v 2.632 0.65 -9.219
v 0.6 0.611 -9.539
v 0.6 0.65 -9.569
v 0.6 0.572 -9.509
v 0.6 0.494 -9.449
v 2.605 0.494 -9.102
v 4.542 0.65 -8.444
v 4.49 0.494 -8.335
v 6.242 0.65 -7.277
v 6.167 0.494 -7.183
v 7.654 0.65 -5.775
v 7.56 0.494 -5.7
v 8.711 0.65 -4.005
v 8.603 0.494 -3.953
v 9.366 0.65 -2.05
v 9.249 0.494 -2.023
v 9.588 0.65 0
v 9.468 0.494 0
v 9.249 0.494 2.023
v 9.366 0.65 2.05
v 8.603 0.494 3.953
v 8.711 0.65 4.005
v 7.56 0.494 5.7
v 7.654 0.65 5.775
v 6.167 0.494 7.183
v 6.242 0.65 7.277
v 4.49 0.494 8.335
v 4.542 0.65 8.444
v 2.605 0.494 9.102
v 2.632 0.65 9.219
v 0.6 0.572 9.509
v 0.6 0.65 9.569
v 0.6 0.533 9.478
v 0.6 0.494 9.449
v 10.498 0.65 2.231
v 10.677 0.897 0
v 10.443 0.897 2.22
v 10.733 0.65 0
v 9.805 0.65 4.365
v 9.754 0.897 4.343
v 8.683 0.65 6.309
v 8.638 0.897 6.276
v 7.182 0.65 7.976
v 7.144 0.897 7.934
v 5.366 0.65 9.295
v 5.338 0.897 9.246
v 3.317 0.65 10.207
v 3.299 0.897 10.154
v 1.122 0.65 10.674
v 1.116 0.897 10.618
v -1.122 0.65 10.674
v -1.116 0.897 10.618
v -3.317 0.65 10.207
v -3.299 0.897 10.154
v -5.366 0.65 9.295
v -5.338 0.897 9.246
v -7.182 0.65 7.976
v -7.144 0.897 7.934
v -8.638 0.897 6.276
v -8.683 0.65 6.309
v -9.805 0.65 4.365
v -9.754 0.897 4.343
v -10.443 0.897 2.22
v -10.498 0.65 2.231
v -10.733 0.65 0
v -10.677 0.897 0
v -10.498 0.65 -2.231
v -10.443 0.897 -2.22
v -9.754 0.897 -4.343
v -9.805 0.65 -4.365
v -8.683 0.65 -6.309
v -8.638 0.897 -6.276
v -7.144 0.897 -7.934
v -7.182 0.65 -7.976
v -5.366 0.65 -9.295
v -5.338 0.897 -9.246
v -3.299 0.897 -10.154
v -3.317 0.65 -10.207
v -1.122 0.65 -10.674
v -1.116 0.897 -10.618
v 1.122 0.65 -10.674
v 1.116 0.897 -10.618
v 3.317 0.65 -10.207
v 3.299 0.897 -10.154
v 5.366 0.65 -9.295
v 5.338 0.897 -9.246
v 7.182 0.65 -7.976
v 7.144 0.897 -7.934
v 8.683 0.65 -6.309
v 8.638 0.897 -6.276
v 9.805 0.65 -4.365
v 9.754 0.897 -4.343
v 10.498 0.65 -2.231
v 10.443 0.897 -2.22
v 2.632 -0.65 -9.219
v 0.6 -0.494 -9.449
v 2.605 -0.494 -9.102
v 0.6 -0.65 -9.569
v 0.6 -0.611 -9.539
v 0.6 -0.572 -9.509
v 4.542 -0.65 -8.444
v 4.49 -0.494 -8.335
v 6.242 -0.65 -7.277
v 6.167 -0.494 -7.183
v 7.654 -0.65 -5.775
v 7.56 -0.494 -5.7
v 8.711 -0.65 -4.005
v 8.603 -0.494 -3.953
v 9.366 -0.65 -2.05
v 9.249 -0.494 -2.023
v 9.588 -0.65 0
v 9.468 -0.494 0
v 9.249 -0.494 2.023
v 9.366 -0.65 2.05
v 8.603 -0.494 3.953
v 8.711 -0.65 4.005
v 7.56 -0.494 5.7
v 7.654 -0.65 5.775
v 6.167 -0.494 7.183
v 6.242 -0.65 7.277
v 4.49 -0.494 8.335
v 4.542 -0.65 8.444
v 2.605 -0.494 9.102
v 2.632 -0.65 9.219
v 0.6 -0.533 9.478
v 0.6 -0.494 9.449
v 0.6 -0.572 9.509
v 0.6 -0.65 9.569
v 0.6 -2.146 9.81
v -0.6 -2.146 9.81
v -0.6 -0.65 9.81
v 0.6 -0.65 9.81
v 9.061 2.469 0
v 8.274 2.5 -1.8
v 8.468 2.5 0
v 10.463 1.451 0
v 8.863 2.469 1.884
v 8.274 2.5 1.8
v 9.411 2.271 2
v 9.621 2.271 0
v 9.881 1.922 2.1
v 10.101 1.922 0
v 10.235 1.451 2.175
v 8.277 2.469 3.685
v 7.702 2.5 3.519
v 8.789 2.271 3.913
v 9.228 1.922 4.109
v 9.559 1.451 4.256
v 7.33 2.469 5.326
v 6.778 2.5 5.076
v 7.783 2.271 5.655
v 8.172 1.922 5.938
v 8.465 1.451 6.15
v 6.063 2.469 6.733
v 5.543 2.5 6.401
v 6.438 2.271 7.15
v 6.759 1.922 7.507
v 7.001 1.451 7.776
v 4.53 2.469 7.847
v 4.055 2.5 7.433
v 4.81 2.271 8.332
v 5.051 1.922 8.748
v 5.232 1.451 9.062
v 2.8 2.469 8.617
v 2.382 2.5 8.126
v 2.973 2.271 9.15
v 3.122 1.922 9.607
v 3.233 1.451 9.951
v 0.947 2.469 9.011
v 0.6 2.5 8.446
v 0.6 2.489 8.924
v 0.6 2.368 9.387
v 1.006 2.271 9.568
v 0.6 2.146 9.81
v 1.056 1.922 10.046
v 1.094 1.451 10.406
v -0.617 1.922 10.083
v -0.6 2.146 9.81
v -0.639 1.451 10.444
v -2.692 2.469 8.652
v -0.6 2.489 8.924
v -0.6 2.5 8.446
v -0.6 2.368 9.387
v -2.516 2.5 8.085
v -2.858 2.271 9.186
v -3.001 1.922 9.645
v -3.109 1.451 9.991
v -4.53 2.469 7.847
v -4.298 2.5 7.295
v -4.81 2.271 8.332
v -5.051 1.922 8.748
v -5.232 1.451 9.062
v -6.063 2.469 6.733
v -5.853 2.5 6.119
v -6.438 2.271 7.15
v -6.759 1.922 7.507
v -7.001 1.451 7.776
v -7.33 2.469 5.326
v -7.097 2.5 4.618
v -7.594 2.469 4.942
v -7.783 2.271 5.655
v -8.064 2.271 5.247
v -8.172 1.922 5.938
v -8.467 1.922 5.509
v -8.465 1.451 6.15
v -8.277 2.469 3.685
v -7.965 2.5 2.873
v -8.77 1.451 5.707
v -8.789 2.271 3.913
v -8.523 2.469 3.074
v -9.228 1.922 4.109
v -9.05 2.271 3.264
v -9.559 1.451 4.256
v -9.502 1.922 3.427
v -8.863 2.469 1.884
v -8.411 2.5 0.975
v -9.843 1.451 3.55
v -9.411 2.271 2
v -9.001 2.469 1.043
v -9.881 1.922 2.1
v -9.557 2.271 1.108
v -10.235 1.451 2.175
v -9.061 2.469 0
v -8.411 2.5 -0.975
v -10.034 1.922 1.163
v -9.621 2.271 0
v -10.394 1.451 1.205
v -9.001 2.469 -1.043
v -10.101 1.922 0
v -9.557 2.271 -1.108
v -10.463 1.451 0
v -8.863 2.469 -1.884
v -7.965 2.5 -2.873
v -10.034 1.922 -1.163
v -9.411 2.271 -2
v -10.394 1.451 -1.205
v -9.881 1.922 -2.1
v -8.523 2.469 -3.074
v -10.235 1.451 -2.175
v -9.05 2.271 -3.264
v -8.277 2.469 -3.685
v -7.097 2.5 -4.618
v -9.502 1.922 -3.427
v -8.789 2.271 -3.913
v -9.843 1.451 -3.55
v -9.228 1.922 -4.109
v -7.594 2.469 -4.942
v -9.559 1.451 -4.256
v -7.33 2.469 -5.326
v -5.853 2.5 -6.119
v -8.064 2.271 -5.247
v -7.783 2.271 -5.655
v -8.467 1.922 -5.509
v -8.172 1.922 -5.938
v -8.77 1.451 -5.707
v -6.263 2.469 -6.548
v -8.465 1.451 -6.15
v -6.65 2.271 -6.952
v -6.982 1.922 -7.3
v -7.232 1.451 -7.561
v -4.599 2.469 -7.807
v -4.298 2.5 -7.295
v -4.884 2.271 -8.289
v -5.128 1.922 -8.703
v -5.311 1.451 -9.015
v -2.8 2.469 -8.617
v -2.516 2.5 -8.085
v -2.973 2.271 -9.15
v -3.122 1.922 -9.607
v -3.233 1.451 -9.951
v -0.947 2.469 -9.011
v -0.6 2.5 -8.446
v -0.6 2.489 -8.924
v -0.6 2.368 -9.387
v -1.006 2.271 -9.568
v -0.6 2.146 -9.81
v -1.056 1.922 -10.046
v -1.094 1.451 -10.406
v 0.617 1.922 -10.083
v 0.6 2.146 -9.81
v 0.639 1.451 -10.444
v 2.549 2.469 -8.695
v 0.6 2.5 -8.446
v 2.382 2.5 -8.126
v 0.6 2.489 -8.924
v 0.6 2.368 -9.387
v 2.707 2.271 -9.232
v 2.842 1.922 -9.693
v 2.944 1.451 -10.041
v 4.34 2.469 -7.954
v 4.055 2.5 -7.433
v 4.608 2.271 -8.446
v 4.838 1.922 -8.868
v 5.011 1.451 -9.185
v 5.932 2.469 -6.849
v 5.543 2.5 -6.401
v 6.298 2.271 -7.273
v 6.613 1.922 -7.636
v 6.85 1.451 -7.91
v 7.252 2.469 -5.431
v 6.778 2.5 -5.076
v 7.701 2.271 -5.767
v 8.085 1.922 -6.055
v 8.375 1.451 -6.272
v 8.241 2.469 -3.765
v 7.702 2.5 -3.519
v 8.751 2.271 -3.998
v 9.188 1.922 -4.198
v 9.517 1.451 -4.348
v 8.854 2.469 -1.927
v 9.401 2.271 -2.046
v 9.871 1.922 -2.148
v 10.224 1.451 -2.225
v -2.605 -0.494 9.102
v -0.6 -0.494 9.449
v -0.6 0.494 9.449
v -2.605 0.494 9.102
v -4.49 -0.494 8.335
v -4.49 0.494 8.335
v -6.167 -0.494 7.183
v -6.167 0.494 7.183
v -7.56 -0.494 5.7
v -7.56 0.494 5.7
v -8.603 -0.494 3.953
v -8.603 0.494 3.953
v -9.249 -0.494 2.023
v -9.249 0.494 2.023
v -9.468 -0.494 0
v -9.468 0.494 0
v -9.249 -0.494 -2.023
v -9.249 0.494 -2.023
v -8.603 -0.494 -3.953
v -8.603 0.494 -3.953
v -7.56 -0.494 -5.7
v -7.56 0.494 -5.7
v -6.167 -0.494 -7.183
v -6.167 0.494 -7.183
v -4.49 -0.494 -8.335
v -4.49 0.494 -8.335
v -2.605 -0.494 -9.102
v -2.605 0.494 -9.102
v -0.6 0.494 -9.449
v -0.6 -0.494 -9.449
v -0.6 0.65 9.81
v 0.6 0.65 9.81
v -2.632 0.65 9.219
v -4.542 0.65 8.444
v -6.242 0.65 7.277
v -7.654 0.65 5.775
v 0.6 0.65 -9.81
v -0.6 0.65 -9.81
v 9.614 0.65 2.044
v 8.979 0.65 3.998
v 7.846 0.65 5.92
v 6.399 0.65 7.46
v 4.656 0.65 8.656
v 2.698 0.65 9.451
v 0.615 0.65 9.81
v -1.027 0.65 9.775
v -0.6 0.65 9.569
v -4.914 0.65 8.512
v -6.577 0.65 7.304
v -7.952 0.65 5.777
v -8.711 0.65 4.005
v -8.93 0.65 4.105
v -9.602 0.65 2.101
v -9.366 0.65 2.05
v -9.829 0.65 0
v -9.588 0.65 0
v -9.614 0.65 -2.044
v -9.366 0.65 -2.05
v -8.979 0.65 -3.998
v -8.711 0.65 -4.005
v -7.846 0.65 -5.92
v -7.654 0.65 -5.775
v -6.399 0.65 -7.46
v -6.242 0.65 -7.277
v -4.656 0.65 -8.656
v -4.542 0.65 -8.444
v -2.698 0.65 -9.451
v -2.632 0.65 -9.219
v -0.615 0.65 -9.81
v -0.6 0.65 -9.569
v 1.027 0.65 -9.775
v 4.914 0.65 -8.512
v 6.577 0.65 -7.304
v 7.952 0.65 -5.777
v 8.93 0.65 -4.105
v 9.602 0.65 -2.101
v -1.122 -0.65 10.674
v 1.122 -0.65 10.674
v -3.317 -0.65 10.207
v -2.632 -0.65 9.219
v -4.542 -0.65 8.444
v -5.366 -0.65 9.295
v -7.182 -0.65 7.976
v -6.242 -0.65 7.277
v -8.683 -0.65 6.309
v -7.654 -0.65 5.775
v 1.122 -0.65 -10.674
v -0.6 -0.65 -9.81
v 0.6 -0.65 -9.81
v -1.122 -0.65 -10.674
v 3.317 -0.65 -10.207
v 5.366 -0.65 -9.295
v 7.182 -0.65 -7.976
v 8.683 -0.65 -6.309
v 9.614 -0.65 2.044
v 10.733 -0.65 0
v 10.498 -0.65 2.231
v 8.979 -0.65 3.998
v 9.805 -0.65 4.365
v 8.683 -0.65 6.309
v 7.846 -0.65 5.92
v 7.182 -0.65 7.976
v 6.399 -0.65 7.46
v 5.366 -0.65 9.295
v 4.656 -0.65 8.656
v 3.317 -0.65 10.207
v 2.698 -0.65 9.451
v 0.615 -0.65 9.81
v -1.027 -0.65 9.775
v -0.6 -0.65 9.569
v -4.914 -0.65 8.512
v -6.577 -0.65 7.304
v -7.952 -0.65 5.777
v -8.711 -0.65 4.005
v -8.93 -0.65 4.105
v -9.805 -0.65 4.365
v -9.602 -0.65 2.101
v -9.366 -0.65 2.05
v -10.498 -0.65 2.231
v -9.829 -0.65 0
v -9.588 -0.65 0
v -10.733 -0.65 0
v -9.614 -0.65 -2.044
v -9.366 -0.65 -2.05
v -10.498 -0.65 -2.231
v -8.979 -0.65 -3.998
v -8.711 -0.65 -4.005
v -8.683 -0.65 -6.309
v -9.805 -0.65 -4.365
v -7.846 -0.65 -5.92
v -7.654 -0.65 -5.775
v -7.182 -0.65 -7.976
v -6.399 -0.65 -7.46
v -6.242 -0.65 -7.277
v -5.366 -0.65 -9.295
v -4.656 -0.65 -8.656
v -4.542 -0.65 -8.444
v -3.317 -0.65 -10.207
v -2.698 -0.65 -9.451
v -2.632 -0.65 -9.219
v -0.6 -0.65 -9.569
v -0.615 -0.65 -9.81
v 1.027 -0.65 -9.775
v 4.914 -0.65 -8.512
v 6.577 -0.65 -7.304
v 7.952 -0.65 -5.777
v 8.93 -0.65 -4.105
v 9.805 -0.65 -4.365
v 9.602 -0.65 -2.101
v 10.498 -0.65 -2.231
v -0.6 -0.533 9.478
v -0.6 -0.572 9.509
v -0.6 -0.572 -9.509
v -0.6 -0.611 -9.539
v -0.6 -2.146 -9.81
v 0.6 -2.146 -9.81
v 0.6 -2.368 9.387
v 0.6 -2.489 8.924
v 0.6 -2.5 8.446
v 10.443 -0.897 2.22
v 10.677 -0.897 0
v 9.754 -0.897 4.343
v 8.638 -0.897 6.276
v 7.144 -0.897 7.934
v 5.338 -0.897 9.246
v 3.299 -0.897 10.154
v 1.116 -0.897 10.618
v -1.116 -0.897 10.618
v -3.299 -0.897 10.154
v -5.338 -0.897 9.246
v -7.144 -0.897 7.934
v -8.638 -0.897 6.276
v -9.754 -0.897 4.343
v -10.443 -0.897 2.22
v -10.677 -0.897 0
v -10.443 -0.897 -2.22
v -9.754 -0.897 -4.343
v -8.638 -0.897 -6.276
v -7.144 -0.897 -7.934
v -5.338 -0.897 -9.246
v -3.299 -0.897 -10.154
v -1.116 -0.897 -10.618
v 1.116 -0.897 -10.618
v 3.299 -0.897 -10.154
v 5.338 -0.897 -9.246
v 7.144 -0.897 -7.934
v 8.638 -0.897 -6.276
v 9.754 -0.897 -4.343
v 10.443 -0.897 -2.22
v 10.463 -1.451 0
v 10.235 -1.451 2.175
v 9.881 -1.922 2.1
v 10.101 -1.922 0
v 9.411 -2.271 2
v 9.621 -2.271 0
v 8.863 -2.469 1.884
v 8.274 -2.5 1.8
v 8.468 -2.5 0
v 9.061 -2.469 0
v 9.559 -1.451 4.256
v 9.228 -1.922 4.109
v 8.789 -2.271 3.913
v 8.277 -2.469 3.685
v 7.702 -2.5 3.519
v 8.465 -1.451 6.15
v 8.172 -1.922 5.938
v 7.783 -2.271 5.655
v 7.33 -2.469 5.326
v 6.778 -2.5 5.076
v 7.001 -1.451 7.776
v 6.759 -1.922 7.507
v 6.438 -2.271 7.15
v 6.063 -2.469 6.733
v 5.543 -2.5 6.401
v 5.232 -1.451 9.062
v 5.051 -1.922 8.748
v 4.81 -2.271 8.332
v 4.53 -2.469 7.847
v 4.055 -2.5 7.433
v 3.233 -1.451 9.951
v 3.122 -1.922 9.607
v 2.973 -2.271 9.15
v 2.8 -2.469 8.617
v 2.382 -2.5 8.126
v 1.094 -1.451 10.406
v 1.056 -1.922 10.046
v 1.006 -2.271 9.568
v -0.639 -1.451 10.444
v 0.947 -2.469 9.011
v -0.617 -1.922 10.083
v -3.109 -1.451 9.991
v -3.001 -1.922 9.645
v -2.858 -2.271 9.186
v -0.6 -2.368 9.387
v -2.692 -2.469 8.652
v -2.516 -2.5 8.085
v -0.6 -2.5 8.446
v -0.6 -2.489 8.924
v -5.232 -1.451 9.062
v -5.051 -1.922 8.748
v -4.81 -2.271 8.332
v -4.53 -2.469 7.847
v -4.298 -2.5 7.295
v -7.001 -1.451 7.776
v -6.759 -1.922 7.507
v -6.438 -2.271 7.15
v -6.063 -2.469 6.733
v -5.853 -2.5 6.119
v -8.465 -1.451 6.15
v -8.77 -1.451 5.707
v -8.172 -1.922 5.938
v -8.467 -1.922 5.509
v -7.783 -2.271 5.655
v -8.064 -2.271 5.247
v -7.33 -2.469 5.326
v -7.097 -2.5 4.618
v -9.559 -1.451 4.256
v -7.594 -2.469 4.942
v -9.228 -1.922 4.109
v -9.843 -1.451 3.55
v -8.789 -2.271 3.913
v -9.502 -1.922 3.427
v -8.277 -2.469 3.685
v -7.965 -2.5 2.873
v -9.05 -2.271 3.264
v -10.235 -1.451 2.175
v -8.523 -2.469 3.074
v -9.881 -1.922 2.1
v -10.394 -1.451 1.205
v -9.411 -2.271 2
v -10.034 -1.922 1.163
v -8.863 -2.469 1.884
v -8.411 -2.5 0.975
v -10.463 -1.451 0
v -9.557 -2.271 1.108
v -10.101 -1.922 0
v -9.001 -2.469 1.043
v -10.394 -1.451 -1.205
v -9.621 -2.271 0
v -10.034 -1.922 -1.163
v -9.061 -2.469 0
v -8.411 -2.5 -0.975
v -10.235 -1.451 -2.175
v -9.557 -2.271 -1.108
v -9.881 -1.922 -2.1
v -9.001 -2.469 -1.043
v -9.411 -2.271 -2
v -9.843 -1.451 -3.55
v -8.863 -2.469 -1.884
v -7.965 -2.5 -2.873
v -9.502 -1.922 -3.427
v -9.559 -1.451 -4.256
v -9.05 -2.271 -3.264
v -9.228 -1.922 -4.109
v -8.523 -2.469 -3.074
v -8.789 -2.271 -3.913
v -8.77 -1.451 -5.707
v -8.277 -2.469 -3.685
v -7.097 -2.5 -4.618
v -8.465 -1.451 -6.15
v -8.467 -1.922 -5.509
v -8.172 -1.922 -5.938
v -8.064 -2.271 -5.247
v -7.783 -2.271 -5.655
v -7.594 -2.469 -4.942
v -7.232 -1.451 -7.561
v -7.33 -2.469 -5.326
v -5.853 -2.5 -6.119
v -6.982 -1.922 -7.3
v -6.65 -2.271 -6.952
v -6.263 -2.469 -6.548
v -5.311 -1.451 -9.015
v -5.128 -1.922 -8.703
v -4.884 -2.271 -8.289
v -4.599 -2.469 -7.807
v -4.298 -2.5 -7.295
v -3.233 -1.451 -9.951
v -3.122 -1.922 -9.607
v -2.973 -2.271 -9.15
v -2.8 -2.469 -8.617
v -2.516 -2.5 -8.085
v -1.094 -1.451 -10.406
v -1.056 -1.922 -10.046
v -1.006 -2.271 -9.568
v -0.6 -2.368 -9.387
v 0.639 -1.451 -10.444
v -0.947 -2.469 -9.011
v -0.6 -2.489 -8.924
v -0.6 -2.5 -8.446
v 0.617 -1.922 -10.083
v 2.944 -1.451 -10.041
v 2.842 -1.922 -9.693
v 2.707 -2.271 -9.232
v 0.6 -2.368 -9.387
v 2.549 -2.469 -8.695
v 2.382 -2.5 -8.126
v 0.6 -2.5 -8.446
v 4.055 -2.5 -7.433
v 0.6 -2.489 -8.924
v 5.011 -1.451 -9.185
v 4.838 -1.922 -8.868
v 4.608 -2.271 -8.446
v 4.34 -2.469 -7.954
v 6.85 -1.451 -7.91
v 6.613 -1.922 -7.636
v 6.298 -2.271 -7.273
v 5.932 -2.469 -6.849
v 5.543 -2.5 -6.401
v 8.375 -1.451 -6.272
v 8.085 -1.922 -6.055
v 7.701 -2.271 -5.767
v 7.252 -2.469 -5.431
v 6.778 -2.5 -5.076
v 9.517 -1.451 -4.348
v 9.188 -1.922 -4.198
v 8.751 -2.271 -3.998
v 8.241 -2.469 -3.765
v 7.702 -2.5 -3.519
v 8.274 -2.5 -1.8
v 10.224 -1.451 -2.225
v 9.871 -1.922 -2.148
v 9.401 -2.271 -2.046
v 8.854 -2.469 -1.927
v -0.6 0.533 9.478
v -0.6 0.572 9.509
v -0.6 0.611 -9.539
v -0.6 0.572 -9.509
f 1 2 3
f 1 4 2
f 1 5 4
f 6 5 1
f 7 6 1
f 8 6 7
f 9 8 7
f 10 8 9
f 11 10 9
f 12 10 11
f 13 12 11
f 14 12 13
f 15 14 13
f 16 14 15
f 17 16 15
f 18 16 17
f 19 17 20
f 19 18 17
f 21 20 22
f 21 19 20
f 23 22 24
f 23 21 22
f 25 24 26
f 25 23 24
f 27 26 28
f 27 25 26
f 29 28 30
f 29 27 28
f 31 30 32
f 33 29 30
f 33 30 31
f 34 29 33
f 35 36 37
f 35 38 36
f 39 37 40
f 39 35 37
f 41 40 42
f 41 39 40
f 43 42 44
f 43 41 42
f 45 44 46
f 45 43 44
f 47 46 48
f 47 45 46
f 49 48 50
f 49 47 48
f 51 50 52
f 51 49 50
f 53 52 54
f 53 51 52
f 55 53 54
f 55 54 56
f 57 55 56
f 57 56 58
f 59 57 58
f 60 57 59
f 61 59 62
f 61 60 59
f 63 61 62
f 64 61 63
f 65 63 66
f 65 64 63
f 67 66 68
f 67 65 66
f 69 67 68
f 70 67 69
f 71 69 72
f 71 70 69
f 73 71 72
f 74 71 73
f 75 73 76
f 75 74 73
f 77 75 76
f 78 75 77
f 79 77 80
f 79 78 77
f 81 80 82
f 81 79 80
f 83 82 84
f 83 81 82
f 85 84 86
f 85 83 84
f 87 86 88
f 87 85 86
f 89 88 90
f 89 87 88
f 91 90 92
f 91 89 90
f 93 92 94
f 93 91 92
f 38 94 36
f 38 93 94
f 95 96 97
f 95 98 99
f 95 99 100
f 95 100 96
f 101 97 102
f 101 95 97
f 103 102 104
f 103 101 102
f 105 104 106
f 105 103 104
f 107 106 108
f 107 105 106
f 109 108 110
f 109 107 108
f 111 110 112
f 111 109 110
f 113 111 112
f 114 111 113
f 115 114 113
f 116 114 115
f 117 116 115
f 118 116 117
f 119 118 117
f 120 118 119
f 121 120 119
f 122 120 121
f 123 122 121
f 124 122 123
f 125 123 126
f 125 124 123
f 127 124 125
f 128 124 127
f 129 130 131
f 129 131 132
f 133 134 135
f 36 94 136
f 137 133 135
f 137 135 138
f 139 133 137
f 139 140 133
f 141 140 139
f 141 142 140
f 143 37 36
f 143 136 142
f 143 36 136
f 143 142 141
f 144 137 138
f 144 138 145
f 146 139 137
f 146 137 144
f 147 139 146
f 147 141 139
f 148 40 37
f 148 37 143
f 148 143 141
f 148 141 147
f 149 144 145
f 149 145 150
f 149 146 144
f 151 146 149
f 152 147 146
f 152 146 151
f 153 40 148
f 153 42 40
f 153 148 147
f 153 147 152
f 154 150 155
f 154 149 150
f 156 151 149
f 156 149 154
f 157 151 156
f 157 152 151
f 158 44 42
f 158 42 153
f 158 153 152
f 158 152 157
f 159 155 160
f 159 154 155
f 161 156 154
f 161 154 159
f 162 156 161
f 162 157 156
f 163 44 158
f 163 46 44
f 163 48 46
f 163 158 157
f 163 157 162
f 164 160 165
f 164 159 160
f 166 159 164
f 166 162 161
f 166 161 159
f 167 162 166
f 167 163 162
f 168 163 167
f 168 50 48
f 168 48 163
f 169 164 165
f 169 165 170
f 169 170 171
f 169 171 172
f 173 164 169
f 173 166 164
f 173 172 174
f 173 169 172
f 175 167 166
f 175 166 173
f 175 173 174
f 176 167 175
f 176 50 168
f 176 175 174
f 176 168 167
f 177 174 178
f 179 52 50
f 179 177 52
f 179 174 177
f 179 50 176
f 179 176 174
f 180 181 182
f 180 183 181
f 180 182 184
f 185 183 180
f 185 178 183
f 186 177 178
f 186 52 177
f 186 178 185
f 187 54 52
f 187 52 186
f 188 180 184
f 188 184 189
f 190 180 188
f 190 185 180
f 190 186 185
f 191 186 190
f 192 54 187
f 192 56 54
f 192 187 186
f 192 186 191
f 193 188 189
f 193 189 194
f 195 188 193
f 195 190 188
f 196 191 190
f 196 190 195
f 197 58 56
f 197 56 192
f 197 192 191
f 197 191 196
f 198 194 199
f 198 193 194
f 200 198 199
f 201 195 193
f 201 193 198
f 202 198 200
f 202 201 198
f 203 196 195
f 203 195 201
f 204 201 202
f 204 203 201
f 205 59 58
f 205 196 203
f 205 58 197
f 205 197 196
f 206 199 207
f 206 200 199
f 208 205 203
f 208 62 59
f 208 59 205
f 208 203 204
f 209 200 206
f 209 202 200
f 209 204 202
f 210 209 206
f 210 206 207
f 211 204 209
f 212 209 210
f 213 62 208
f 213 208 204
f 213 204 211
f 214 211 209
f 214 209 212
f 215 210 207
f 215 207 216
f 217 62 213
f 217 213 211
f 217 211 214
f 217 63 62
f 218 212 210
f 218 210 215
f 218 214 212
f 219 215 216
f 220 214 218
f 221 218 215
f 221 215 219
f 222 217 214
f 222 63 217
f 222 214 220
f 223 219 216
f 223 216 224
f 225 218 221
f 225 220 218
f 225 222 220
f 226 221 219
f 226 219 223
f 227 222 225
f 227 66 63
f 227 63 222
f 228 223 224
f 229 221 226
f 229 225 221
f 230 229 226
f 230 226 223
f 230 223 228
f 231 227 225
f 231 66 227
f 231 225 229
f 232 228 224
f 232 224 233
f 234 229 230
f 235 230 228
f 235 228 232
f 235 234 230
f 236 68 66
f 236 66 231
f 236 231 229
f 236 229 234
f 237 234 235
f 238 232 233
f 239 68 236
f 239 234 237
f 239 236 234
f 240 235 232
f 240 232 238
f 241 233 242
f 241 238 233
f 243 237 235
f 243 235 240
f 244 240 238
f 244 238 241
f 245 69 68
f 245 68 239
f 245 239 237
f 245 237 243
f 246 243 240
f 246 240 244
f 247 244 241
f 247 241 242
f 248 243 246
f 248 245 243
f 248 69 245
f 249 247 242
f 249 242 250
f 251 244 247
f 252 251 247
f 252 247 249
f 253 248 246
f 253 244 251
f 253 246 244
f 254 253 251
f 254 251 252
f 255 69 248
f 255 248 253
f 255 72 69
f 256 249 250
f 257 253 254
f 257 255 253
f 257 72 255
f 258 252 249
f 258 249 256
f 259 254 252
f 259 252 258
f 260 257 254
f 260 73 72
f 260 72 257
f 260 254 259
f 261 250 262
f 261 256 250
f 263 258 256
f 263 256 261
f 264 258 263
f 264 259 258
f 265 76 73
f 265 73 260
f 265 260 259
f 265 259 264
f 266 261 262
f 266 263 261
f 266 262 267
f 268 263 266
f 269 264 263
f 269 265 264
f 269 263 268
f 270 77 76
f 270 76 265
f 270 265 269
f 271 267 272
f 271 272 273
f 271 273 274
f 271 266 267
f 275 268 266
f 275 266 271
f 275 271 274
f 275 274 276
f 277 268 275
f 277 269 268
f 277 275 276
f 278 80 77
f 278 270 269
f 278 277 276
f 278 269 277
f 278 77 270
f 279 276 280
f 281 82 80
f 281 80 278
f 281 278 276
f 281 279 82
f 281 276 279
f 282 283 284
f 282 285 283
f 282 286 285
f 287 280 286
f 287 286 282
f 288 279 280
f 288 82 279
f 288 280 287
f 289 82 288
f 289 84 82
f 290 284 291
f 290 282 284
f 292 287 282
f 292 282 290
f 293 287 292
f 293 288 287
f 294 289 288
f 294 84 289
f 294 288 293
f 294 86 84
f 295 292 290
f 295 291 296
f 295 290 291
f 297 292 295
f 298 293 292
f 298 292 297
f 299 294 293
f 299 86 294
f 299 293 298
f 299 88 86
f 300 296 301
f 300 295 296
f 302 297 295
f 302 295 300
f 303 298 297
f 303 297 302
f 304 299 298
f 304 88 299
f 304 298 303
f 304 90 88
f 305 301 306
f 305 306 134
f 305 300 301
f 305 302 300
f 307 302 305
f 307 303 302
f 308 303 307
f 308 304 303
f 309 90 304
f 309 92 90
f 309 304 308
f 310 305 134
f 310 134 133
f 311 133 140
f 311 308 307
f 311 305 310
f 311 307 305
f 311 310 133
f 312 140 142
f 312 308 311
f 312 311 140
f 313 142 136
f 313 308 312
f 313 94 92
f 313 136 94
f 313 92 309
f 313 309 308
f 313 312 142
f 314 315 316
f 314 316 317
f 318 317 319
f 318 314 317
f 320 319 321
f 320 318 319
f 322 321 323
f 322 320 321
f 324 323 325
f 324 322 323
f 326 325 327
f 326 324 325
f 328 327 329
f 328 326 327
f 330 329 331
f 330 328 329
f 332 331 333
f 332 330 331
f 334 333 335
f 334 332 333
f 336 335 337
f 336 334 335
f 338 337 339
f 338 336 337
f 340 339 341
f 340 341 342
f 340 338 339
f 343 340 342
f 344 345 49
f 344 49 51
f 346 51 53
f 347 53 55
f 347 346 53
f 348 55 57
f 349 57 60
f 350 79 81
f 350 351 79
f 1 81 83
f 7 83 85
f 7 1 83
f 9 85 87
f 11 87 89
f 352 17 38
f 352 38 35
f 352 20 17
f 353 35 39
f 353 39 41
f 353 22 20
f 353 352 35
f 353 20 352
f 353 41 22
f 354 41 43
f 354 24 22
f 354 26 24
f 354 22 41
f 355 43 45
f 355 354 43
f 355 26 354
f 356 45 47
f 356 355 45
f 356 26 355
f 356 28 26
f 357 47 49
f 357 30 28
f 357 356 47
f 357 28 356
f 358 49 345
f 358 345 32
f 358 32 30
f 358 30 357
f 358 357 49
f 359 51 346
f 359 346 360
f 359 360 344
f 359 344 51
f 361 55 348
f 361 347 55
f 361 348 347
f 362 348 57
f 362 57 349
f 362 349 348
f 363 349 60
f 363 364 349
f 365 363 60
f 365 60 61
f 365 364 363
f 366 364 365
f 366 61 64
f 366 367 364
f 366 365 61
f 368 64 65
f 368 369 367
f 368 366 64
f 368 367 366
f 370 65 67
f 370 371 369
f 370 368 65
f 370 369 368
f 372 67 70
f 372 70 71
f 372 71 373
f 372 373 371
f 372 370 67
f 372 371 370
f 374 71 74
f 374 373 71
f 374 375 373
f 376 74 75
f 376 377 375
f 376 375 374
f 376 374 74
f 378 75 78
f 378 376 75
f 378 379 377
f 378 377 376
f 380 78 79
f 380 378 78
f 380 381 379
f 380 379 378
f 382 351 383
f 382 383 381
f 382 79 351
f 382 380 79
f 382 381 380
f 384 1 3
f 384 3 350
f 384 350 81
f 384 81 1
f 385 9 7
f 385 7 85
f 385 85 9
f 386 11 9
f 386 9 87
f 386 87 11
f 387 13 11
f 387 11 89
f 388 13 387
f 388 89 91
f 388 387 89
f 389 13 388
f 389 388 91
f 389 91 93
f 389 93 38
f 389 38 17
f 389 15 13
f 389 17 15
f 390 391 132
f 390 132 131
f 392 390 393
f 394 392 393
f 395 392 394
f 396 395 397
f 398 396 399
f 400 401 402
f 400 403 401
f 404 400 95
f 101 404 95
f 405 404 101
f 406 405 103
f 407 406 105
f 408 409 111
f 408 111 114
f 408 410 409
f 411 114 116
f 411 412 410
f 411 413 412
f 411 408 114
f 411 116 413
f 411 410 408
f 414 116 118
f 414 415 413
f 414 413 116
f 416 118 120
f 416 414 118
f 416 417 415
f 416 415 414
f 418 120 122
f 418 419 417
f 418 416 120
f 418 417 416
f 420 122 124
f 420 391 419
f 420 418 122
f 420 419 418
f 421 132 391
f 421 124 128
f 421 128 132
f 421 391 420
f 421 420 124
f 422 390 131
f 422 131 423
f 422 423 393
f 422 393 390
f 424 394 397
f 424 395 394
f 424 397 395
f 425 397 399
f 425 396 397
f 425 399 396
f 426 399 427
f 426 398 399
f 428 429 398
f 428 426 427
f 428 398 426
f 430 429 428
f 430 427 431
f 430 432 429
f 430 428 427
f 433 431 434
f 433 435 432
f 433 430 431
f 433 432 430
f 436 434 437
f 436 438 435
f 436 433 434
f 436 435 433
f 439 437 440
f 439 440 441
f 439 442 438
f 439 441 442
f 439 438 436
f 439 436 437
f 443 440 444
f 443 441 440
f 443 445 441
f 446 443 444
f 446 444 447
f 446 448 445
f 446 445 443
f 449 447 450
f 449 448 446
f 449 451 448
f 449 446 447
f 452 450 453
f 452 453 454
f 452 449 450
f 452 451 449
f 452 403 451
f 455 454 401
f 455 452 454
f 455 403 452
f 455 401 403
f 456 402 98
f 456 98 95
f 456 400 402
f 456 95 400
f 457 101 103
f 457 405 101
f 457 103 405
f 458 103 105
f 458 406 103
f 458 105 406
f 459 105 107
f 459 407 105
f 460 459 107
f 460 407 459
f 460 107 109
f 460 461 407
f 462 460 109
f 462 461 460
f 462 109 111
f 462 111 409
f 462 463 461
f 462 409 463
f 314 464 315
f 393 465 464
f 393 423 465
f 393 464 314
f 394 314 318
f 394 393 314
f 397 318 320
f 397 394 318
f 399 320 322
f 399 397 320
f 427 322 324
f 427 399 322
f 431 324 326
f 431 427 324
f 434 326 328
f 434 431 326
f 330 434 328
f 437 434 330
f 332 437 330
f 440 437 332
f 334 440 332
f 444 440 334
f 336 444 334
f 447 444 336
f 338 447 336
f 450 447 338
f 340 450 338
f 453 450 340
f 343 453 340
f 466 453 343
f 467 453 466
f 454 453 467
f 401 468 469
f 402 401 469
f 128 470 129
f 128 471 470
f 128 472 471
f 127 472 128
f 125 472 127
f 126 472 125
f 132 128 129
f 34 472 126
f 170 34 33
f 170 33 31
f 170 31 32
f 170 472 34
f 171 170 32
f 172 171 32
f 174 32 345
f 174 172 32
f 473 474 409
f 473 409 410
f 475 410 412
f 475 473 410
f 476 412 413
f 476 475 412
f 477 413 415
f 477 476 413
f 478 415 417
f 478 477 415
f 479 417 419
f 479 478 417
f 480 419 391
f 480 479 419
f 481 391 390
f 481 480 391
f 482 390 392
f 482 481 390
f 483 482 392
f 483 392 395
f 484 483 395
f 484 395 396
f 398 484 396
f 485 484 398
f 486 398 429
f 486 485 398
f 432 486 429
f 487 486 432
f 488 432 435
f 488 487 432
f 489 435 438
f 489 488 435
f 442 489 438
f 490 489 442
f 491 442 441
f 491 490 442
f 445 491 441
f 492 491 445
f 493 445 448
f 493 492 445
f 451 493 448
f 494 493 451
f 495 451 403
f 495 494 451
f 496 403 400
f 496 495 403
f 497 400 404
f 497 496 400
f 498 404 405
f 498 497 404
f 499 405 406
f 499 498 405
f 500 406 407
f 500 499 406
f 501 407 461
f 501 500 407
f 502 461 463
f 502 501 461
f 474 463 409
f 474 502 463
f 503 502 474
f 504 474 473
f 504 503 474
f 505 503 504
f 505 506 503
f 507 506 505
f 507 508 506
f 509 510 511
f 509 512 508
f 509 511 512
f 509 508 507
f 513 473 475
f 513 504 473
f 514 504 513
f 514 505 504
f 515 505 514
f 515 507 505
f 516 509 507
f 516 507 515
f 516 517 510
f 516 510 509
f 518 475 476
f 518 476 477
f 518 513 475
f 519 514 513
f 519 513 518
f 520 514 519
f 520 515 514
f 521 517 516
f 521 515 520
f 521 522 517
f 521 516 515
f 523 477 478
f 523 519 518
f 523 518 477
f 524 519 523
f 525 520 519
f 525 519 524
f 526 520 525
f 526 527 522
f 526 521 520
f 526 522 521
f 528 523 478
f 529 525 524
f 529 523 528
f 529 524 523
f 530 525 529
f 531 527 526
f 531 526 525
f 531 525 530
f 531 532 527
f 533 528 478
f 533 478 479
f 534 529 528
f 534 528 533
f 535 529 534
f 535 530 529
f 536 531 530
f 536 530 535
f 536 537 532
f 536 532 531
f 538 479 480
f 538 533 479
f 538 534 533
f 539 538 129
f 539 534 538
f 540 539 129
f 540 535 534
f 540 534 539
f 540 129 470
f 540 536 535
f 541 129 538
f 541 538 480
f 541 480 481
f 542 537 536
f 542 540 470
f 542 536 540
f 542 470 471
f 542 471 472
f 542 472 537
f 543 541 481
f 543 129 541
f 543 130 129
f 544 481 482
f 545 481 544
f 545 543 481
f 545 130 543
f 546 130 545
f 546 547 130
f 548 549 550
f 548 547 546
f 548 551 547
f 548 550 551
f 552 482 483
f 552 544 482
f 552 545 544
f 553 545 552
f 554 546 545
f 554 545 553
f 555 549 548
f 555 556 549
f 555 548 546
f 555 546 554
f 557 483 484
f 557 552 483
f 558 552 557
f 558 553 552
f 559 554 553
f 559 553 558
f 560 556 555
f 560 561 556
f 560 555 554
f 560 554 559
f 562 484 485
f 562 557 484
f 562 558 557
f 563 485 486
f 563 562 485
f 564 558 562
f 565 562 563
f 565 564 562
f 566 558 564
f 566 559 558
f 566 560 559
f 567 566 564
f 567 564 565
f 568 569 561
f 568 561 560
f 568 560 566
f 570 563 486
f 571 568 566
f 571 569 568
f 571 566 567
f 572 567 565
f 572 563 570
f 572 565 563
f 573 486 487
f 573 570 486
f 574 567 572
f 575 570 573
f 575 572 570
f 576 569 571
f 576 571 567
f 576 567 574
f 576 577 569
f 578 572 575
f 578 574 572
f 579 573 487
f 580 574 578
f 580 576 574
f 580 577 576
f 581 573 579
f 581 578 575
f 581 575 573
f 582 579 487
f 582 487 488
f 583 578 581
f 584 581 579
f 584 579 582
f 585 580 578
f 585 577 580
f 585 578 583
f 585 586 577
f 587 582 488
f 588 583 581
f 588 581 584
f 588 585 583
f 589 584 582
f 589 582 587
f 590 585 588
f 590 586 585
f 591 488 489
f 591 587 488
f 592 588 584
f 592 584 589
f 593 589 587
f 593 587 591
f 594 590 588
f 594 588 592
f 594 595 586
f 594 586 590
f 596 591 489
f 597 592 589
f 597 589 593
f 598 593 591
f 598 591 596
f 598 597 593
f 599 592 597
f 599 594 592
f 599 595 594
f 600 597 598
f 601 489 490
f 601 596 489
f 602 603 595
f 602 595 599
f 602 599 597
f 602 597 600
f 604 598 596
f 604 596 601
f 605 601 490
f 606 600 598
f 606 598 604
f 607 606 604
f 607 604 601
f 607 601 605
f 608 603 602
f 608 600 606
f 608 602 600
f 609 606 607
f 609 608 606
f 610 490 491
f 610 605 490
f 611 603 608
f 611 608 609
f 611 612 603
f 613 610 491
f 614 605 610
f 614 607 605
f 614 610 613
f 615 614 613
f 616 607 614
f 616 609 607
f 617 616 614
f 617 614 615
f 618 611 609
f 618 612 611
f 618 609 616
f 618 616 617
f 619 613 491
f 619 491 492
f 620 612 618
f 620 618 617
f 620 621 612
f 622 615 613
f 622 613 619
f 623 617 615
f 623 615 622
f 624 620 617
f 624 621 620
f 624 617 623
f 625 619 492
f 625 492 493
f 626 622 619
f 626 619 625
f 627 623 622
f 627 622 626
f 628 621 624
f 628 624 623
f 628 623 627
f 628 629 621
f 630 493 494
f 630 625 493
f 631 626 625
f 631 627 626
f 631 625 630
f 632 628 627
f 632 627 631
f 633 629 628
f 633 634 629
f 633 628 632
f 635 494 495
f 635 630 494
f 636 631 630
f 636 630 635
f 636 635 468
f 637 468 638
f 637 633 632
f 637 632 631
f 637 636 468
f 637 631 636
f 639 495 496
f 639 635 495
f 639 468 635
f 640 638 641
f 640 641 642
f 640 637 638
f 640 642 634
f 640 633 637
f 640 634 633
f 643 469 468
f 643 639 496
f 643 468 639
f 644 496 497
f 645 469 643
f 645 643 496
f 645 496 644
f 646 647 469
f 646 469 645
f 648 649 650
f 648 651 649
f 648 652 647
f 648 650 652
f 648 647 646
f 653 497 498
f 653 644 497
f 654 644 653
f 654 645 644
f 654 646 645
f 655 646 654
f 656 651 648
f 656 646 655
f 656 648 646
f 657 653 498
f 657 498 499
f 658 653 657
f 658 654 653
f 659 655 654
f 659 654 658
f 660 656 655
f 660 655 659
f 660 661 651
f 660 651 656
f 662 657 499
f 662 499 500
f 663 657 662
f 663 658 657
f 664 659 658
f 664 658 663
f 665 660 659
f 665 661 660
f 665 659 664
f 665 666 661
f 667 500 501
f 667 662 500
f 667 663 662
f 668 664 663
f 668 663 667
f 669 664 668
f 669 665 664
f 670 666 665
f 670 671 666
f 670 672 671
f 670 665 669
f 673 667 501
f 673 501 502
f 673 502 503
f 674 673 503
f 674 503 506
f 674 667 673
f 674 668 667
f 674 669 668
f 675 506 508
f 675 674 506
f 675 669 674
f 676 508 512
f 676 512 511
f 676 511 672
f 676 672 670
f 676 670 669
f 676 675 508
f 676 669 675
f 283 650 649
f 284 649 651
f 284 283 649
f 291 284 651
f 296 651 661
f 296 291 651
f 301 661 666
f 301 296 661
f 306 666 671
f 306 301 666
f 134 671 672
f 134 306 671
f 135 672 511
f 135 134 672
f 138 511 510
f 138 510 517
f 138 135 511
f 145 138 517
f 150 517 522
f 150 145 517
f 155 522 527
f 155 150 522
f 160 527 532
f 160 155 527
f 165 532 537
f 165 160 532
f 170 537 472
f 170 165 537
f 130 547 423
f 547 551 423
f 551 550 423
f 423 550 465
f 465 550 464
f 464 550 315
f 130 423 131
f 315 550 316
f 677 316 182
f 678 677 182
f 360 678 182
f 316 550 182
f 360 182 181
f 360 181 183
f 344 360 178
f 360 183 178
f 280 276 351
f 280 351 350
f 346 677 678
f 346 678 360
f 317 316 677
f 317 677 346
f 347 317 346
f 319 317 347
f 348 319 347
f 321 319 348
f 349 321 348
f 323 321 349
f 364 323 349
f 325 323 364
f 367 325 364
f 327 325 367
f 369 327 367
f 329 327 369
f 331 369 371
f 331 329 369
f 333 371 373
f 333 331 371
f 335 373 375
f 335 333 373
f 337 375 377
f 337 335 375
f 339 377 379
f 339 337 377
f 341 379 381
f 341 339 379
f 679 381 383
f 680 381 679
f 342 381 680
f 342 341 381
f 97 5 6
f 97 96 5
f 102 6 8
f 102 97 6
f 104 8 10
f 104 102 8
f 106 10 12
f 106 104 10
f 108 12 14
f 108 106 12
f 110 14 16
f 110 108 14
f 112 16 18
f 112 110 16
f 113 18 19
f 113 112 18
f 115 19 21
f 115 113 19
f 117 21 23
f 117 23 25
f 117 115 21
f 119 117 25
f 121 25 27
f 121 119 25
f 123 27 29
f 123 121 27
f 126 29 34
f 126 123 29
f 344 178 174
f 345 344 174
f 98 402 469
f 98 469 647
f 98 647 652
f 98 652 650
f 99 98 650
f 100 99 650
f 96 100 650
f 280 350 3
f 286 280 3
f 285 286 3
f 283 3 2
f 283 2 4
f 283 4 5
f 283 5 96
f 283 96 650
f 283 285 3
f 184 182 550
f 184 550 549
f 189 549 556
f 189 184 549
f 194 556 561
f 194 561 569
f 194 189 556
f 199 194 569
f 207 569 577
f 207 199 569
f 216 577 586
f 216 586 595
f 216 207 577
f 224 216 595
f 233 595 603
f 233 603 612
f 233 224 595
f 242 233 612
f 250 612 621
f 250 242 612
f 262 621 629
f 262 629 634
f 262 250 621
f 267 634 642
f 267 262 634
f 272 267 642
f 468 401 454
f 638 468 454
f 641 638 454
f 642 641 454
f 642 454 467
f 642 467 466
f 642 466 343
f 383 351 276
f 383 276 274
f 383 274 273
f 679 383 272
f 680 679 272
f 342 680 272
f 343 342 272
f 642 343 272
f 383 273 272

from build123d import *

# Parameters (mm, degrees)
F4_W          = 1.2
F4_H          = 19.620869044
F5_DEPTH      = 25
F5_DEPTH_BACK = 25


# Not quite as in the source:
# - a fillet or chamfer that OpenCascade refuses, or shapes differently, is made with other operations: its cross-section is extruded or revolved along the edge and cut away or added


with BuildPart() as f2:
    # F2: sweep along a path in F0
    with BuildLine(Plane.XZ) as f2_path:
        CenterArc((0, 0), 8.875, 0, 360)
    # F1 (on Right) → F2 (sweep)
    with BuildSketch(Plane.YZ):
        Polygon((-2.5, 8.4675319269), (0, 8.4675319269), (2.5, 8.4675319269), (2.7924242295, 10.246030055), (0.65, 10.7327634469), (0.65, 9.5877971399), (0.494154765, 9.4675319269), (0, 9.4675319269), (-0.494154765, 9.4675319269), (-0.65, 9.5877971399), (-0.65, 10.7327634469), (-2.7924242295, 10.246030055), align=None)
    sweep(path=f2_path.line)

    # F3: fillet of radius 2.0708896165 on 2 edges, made by hand

    # F3_s1 → F3_t2 (revolve, cut)
    with BuildSketch(Plane.XY):
        with BuildLine():
            ThreePointArc((10.6767355553, -0.8966145009), (9.8737027886, -2.1138201975), (8.4675319269, -2.5))
            Line((8.4675319269, -2.5), (10.246030055, -2.7924242295))
            Line((10.246030055, -2.7924242295), (10.6767355553, -0.8966145009))
        make_face()
    revolve(axis=Axis((0, -2.7924242295, 0), (0, -1, 0)), mode=Mode.SUBTRACT)

    # F3_s3 → F3_t4 (revolve, cut)
    with BuildSketch(Plane.XY):
        with BuildLine():
            ThreePointArc((8.4675319269, 2.5), (9.8737027886, 2.1138201975), (10.6767355553, 0.8966145009))
            Line((10.6767355553, 0.8966145009), (10.246030055, 2.7924242295))
            Line((10.246030055, 2.7924242295), (8.4675319269, 2.5))
        make_face()
    revolve(axis=Axis((0, 2.7924242295, 0), (0, -1, 0)), mode=Mode.SUBTRACT)

    # F4 (on Front) → F5 (cut, two sides)
    with BuildSketch(Plane.XZ) as f5_sk:
        Rectangle(F4_W, F4_H)
    extrude(amount=-F5_DEPTH, mode=Mode.SUBTRACT)
    extrude(f5_sk.sketch, amount=F5_DEPTH_BACK, mode=Mode.SUBTRACT)


solid = f2.part
